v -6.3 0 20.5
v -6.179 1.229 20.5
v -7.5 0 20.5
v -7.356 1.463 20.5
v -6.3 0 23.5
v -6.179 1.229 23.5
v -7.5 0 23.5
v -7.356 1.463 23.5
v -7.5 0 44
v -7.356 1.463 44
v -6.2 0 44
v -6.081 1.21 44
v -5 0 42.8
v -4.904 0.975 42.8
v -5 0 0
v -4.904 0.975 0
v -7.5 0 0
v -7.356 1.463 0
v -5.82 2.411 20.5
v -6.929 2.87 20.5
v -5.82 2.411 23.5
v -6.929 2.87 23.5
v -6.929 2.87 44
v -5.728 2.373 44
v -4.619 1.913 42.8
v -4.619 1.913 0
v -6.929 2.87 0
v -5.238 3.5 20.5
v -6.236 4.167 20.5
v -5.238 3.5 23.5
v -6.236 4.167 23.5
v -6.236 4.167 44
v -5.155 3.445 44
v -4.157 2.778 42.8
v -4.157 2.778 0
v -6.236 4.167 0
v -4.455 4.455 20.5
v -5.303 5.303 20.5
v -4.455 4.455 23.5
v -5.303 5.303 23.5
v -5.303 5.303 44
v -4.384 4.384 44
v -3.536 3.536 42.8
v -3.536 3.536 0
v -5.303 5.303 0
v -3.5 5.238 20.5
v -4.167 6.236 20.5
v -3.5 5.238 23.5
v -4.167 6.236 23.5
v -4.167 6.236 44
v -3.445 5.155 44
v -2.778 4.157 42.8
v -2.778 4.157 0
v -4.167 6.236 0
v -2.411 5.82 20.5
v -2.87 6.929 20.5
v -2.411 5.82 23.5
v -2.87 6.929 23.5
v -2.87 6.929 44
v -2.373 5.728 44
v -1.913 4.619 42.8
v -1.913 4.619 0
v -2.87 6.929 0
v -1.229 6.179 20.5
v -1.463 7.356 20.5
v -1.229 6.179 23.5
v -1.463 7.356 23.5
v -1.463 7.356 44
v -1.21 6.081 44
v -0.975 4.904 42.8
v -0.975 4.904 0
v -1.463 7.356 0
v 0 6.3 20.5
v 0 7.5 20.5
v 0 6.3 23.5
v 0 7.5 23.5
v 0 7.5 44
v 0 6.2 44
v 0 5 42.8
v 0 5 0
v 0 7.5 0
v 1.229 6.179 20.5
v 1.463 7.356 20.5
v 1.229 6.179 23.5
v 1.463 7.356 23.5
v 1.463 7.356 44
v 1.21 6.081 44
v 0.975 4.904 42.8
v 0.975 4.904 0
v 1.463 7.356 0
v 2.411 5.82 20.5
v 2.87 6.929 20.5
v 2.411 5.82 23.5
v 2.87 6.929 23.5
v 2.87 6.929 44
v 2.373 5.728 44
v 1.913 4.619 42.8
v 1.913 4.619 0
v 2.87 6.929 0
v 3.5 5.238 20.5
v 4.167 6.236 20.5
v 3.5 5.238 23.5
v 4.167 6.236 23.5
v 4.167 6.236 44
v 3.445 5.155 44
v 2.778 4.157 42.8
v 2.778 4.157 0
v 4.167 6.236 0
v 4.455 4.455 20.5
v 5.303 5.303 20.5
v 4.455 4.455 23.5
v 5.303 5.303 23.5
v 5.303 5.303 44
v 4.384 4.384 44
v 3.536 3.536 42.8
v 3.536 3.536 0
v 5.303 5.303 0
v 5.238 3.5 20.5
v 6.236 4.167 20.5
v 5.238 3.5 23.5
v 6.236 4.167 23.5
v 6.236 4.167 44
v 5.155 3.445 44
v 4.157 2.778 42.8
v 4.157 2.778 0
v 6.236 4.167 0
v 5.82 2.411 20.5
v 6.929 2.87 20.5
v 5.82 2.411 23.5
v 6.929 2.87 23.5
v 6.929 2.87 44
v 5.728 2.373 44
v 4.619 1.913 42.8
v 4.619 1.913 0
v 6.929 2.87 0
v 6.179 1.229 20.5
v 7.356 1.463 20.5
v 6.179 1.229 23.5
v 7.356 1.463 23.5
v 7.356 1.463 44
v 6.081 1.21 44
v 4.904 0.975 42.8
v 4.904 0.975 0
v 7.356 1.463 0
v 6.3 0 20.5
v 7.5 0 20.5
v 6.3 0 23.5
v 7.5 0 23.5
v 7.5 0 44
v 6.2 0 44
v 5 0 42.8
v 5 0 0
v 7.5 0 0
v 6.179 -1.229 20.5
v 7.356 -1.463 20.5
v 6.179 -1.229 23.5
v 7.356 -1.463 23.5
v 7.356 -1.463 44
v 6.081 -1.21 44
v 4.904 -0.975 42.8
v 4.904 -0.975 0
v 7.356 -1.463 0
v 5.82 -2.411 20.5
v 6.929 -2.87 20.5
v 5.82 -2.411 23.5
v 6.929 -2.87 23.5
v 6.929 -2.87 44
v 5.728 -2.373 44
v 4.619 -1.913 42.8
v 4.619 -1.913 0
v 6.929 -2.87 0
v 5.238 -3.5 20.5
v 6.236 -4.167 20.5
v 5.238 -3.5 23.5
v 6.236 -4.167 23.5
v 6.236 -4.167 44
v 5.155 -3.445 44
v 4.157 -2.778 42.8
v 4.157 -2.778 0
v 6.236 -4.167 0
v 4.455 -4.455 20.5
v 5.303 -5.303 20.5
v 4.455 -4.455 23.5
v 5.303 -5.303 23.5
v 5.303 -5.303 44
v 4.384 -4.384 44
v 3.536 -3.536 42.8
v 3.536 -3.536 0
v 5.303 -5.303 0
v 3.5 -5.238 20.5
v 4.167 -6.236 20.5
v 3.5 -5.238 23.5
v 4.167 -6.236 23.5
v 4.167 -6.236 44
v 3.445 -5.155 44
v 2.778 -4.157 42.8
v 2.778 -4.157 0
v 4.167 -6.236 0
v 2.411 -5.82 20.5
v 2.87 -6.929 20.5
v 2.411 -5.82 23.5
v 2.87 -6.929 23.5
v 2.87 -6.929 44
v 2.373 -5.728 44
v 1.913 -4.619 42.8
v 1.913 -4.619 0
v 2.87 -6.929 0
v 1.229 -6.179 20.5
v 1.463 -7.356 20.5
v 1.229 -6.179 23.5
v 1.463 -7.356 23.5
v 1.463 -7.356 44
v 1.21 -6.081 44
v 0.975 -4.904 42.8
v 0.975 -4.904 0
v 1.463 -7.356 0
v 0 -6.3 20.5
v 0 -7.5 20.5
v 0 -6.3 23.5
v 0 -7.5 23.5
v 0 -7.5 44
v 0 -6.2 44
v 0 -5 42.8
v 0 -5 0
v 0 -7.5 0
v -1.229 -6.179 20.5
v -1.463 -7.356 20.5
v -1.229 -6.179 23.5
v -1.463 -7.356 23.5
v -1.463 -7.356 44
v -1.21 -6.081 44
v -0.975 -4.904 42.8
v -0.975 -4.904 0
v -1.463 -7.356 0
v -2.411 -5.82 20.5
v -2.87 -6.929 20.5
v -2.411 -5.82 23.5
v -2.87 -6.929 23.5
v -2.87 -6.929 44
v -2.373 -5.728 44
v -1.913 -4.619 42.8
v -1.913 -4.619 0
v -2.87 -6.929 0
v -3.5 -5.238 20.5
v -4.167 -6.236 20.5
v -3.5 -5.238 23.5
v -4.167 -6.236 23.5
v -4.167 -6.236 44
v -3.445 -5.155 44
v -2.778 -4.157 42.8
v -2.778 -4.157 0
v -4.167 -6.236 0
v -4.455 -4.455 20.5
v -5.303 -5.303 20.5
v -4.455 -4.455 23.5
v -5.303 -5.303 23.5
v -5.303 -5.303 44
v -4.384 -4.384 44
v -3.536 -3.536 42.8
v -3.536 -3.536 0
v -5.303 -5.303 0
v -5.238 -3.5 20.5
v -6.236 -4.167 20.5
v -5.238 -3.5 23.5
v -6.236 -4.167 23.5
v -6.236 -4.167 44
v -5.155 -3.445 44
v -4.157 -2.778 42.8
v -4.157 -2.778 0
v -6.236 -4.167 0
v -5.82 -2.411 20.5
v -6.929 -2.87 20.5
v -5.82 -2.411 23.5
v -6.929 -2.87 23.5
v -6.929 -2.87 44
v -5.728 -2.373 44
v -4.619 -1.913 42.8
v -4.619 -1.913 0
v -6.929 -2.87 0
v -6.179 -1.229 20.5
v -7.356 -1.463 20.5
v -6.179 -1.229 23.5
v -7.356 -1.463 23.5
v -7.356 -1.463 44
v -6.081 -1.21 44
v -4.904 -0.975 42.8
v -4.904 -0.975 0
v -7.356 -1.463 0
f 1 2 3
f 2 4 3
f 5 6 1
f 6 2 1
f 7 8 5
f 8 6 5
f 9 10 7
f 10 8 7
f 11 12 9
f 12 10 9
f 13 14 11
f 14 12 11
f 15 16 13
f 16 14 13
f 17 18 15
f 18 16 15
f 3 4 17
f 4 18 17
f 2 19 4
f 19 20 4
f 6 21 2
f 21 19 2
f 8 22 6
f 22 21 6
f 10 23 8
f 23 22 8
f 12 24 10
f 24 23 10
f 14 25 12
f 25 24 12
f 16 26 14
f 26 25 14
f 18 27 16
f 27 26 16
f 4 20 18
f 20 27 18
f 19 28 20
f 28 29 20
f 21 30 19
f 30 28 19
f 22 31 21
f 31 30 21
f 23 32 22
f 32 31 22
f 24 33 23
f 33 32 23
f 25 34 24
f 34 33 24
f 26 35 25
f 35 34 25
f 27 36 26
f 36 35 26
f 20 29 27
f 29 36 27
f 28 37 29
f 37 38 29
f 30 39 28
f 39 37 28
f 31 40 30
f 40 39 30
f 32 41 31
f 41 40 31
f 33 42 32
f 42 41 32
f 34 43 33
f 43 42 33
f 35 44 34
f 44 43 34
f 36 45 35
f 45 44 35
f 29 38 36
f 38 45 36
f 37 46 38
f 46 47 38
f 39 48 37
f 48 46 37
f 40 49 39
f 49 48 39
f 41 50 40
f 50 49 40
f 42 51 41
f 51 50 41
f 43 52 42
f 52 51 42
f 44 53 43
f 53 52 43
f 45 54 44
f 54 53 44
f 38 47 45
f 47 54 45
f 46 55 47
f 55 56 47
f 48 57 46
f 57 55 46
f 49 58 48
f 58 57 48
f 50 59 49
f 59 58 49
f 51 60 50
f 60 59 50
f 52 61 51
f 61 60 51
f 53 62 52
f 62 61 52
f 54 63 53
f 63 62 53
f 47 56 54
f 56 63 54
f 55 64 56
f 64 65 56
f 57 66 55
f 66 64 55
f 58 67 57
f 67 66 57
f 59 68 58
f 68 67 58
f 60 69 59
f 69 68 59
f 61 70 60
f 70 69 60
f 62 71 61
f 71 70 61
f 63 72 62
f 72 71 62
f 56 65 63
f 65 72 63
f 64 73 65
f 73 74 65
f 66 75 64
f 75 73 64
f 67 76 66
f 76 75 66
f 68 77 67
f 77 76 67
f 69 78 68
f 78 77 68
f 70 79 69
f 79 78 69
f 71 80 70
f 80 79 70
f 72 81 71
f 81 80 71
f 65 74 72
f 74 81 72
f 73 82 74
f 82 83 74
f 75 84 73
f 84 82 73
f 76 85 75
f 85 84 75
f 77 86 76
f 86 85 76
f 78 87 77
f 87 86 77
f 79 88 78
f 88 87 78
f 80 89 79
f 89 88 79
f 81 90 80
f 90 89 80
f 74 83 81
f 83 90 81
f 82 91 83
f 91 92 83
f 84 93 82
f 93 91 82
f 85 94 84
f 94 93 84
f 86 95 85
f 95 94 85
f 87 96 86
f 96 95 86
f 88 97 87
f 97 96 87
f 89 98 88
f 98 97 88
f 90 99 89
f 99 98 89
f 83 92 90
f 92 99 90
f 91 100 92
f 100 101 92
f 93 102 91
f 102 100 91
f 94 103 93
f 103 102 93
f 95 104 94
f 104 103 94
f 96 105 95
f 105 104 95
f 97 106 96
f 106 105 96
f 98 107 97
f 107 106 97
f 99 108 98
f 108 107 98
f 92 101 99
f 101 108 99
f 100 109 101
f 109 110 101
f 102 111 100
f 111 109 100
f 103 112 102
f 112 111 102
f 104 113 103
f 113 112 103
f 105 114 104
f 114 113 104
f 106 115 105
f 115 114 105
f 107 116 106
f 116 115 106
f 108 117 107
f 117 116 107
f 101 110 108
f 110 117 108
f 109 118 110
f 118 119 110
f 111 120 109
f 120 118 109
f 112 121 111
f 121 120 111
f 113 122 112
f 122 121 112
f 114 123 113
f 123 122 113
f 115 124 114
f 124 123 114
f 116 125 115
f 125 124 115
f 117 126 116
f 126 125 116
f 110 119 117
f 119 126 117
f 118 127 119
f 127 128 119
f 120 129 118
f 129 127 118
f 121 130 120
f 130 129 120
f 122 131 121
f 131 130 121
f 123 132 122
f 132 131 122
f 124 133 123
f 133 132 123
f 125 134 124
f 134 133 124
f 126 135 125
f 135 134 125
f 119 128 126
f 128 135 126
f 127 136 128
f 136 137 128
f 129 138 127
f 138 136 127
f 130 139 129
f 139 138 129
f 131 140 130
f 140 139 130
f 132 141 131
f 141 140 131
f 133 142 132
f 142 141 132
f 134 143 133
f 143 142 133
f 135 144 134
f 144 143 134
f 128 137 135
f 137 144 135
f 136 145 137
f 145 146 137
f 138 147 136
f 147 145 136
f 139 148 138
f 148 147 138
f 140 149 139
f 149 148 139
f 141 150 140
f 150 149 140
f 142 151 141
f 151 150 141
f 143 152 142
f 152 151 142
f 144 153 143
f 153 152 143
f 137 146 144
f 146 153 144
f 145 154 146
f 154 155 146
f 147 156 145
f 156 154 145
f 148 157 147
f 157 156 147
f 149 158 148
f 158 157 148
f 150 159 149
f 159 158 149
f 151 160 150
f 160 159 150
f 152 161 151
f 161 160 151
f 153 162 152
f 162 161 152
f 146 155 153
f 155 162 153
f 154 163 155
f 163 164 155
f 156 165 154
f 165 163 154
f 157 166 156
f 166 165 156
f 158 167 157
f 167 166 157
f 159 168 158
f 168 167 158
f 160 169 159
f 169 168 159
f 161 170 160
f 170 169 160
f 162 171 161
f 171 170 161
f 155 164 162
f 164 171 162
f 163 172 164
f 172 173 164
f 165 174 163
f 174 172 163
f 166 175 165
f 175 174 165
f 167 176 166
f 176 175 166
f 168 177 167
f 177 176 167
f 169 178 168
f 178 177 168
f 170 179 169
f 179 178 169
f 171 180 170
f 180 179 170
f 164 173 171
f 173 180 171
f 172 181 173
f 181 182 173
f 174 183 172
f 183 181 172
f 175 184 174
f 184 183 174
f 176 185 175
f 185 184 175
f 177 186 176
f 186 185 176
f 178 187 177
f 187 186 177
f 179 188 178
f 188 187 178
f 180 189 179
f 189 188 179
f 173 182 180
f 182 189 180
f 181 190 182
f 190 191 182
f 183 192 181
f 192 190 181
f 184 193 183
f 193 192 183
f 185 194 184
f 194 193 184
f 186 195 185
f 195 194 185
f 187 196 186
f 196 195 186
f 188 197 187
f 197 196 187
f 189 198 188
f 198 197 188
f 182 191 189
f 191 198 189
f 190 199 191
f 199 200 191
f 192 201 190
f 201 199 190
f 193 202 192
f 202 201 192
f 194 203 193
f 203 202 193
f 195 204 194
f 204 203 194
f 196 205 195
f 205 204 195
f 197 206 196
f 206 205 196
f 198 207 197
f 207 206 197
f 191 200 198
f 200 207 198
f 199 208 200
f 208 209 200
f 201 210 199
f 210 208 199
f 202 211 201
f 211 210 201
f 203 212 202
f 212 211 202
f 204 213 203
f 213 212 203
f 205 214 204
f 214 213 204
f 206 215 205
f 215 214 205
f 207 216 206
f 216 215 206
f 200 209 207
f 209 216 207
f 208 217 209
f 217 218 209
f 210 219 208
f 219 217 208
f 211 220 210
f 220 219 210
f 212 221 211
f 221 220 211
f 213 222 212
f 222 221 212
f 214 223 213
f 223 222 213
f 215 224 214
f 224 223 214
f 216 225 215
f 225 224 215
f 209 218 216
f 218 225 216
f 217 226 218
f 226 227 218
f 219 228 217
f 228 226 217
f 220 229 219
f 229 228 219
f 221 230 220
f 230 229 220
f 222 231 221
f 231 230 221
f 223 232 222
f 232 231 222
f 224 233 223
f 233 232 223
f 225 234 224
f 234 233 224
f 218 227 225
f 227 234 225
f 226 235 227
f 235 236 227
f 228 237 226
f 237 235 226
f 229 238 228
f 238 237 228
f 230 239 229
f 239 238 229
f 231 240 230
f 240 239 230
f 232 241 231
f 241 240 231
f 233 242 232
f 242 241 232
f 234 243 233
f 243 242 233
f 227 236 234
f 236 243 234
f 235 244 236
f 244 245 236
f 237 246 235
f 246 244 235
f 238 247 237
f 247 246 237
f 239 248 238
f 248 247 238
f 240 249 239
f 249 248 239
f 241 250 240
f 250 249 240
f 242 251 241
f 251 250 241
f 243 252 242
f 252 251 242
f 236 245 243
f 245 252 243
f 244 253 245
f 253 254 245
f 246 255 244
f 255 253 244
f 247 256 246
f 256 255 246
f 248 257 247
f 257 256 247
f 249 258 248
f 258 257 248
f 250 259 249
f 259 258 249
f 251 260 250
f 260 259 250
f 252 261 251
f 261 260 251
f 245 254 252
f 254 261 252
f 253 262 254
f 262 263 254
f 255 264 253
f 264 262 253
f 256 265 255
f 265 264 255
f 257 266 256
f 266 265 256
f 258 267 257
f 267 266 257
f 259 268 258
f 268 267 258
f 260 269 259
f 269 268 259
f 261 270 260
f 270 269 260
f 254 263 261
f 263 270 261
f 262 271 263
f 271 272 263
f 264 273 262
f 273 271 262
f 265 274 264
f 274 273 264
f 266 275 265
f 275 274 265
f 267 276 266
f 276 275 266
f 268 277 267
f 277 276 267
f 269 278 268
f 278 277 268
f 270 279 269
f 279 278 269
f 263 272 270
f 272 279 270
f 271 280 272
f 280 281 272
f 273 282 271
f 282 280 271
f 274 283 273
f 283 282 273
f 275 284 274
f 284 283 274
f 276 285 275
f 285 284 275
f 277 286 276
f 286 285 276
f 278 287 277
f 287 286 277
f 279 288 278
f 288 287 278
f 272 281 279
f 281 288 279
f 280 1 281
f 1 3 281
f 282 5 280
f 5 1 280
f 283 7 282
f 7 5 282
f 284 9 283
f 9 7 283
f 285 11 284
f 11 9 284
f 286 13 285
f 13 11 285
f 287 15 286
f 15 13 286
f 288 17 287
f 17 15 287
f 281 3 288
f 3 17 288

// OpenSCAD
$fn = 32;

// ----------------------------------------------------------------------
// Grooved revolve: thread_relief, bore R5
// ----------------------------------------------------------------------

// --- parameters (mm) ---
bore_r = 5;               // bore radius
outer_r = 7.5;            // outer radius of the body
total_h = 44;             // overall height, Z
wall = 2.5;               // radial wall thickness
groove_w = 3;             // groove width
groove_d = 1.2;           // groove depth
grooves = 1;              // number of outer grooves
relief = 1.2;             // thread relief leg at the bore mouth
relief_angle = 45;        // thread relief chamfer angle, degrees

bbox_x = 2 * outer_r;  // full diameter
bore_d = 2 * bore_r;  // bore diameter
body_d = 2 * outer_r;  // body diameter
revolve_angle = 360;  // full turn around the Z axis

profile = [[5, 0], [7.5, 0], [7.5, 20.5], [6.3, 20.5], [6.3, 23.5], [7.5, 23.5], [7.5, 44], [6.2, 44], [5, 42.8]];  // primary outline, 9 points, counter clockwise

// --- the one profile operation ---
rotate_extrude(angle = revolve_angle) polygon(points = profile);
